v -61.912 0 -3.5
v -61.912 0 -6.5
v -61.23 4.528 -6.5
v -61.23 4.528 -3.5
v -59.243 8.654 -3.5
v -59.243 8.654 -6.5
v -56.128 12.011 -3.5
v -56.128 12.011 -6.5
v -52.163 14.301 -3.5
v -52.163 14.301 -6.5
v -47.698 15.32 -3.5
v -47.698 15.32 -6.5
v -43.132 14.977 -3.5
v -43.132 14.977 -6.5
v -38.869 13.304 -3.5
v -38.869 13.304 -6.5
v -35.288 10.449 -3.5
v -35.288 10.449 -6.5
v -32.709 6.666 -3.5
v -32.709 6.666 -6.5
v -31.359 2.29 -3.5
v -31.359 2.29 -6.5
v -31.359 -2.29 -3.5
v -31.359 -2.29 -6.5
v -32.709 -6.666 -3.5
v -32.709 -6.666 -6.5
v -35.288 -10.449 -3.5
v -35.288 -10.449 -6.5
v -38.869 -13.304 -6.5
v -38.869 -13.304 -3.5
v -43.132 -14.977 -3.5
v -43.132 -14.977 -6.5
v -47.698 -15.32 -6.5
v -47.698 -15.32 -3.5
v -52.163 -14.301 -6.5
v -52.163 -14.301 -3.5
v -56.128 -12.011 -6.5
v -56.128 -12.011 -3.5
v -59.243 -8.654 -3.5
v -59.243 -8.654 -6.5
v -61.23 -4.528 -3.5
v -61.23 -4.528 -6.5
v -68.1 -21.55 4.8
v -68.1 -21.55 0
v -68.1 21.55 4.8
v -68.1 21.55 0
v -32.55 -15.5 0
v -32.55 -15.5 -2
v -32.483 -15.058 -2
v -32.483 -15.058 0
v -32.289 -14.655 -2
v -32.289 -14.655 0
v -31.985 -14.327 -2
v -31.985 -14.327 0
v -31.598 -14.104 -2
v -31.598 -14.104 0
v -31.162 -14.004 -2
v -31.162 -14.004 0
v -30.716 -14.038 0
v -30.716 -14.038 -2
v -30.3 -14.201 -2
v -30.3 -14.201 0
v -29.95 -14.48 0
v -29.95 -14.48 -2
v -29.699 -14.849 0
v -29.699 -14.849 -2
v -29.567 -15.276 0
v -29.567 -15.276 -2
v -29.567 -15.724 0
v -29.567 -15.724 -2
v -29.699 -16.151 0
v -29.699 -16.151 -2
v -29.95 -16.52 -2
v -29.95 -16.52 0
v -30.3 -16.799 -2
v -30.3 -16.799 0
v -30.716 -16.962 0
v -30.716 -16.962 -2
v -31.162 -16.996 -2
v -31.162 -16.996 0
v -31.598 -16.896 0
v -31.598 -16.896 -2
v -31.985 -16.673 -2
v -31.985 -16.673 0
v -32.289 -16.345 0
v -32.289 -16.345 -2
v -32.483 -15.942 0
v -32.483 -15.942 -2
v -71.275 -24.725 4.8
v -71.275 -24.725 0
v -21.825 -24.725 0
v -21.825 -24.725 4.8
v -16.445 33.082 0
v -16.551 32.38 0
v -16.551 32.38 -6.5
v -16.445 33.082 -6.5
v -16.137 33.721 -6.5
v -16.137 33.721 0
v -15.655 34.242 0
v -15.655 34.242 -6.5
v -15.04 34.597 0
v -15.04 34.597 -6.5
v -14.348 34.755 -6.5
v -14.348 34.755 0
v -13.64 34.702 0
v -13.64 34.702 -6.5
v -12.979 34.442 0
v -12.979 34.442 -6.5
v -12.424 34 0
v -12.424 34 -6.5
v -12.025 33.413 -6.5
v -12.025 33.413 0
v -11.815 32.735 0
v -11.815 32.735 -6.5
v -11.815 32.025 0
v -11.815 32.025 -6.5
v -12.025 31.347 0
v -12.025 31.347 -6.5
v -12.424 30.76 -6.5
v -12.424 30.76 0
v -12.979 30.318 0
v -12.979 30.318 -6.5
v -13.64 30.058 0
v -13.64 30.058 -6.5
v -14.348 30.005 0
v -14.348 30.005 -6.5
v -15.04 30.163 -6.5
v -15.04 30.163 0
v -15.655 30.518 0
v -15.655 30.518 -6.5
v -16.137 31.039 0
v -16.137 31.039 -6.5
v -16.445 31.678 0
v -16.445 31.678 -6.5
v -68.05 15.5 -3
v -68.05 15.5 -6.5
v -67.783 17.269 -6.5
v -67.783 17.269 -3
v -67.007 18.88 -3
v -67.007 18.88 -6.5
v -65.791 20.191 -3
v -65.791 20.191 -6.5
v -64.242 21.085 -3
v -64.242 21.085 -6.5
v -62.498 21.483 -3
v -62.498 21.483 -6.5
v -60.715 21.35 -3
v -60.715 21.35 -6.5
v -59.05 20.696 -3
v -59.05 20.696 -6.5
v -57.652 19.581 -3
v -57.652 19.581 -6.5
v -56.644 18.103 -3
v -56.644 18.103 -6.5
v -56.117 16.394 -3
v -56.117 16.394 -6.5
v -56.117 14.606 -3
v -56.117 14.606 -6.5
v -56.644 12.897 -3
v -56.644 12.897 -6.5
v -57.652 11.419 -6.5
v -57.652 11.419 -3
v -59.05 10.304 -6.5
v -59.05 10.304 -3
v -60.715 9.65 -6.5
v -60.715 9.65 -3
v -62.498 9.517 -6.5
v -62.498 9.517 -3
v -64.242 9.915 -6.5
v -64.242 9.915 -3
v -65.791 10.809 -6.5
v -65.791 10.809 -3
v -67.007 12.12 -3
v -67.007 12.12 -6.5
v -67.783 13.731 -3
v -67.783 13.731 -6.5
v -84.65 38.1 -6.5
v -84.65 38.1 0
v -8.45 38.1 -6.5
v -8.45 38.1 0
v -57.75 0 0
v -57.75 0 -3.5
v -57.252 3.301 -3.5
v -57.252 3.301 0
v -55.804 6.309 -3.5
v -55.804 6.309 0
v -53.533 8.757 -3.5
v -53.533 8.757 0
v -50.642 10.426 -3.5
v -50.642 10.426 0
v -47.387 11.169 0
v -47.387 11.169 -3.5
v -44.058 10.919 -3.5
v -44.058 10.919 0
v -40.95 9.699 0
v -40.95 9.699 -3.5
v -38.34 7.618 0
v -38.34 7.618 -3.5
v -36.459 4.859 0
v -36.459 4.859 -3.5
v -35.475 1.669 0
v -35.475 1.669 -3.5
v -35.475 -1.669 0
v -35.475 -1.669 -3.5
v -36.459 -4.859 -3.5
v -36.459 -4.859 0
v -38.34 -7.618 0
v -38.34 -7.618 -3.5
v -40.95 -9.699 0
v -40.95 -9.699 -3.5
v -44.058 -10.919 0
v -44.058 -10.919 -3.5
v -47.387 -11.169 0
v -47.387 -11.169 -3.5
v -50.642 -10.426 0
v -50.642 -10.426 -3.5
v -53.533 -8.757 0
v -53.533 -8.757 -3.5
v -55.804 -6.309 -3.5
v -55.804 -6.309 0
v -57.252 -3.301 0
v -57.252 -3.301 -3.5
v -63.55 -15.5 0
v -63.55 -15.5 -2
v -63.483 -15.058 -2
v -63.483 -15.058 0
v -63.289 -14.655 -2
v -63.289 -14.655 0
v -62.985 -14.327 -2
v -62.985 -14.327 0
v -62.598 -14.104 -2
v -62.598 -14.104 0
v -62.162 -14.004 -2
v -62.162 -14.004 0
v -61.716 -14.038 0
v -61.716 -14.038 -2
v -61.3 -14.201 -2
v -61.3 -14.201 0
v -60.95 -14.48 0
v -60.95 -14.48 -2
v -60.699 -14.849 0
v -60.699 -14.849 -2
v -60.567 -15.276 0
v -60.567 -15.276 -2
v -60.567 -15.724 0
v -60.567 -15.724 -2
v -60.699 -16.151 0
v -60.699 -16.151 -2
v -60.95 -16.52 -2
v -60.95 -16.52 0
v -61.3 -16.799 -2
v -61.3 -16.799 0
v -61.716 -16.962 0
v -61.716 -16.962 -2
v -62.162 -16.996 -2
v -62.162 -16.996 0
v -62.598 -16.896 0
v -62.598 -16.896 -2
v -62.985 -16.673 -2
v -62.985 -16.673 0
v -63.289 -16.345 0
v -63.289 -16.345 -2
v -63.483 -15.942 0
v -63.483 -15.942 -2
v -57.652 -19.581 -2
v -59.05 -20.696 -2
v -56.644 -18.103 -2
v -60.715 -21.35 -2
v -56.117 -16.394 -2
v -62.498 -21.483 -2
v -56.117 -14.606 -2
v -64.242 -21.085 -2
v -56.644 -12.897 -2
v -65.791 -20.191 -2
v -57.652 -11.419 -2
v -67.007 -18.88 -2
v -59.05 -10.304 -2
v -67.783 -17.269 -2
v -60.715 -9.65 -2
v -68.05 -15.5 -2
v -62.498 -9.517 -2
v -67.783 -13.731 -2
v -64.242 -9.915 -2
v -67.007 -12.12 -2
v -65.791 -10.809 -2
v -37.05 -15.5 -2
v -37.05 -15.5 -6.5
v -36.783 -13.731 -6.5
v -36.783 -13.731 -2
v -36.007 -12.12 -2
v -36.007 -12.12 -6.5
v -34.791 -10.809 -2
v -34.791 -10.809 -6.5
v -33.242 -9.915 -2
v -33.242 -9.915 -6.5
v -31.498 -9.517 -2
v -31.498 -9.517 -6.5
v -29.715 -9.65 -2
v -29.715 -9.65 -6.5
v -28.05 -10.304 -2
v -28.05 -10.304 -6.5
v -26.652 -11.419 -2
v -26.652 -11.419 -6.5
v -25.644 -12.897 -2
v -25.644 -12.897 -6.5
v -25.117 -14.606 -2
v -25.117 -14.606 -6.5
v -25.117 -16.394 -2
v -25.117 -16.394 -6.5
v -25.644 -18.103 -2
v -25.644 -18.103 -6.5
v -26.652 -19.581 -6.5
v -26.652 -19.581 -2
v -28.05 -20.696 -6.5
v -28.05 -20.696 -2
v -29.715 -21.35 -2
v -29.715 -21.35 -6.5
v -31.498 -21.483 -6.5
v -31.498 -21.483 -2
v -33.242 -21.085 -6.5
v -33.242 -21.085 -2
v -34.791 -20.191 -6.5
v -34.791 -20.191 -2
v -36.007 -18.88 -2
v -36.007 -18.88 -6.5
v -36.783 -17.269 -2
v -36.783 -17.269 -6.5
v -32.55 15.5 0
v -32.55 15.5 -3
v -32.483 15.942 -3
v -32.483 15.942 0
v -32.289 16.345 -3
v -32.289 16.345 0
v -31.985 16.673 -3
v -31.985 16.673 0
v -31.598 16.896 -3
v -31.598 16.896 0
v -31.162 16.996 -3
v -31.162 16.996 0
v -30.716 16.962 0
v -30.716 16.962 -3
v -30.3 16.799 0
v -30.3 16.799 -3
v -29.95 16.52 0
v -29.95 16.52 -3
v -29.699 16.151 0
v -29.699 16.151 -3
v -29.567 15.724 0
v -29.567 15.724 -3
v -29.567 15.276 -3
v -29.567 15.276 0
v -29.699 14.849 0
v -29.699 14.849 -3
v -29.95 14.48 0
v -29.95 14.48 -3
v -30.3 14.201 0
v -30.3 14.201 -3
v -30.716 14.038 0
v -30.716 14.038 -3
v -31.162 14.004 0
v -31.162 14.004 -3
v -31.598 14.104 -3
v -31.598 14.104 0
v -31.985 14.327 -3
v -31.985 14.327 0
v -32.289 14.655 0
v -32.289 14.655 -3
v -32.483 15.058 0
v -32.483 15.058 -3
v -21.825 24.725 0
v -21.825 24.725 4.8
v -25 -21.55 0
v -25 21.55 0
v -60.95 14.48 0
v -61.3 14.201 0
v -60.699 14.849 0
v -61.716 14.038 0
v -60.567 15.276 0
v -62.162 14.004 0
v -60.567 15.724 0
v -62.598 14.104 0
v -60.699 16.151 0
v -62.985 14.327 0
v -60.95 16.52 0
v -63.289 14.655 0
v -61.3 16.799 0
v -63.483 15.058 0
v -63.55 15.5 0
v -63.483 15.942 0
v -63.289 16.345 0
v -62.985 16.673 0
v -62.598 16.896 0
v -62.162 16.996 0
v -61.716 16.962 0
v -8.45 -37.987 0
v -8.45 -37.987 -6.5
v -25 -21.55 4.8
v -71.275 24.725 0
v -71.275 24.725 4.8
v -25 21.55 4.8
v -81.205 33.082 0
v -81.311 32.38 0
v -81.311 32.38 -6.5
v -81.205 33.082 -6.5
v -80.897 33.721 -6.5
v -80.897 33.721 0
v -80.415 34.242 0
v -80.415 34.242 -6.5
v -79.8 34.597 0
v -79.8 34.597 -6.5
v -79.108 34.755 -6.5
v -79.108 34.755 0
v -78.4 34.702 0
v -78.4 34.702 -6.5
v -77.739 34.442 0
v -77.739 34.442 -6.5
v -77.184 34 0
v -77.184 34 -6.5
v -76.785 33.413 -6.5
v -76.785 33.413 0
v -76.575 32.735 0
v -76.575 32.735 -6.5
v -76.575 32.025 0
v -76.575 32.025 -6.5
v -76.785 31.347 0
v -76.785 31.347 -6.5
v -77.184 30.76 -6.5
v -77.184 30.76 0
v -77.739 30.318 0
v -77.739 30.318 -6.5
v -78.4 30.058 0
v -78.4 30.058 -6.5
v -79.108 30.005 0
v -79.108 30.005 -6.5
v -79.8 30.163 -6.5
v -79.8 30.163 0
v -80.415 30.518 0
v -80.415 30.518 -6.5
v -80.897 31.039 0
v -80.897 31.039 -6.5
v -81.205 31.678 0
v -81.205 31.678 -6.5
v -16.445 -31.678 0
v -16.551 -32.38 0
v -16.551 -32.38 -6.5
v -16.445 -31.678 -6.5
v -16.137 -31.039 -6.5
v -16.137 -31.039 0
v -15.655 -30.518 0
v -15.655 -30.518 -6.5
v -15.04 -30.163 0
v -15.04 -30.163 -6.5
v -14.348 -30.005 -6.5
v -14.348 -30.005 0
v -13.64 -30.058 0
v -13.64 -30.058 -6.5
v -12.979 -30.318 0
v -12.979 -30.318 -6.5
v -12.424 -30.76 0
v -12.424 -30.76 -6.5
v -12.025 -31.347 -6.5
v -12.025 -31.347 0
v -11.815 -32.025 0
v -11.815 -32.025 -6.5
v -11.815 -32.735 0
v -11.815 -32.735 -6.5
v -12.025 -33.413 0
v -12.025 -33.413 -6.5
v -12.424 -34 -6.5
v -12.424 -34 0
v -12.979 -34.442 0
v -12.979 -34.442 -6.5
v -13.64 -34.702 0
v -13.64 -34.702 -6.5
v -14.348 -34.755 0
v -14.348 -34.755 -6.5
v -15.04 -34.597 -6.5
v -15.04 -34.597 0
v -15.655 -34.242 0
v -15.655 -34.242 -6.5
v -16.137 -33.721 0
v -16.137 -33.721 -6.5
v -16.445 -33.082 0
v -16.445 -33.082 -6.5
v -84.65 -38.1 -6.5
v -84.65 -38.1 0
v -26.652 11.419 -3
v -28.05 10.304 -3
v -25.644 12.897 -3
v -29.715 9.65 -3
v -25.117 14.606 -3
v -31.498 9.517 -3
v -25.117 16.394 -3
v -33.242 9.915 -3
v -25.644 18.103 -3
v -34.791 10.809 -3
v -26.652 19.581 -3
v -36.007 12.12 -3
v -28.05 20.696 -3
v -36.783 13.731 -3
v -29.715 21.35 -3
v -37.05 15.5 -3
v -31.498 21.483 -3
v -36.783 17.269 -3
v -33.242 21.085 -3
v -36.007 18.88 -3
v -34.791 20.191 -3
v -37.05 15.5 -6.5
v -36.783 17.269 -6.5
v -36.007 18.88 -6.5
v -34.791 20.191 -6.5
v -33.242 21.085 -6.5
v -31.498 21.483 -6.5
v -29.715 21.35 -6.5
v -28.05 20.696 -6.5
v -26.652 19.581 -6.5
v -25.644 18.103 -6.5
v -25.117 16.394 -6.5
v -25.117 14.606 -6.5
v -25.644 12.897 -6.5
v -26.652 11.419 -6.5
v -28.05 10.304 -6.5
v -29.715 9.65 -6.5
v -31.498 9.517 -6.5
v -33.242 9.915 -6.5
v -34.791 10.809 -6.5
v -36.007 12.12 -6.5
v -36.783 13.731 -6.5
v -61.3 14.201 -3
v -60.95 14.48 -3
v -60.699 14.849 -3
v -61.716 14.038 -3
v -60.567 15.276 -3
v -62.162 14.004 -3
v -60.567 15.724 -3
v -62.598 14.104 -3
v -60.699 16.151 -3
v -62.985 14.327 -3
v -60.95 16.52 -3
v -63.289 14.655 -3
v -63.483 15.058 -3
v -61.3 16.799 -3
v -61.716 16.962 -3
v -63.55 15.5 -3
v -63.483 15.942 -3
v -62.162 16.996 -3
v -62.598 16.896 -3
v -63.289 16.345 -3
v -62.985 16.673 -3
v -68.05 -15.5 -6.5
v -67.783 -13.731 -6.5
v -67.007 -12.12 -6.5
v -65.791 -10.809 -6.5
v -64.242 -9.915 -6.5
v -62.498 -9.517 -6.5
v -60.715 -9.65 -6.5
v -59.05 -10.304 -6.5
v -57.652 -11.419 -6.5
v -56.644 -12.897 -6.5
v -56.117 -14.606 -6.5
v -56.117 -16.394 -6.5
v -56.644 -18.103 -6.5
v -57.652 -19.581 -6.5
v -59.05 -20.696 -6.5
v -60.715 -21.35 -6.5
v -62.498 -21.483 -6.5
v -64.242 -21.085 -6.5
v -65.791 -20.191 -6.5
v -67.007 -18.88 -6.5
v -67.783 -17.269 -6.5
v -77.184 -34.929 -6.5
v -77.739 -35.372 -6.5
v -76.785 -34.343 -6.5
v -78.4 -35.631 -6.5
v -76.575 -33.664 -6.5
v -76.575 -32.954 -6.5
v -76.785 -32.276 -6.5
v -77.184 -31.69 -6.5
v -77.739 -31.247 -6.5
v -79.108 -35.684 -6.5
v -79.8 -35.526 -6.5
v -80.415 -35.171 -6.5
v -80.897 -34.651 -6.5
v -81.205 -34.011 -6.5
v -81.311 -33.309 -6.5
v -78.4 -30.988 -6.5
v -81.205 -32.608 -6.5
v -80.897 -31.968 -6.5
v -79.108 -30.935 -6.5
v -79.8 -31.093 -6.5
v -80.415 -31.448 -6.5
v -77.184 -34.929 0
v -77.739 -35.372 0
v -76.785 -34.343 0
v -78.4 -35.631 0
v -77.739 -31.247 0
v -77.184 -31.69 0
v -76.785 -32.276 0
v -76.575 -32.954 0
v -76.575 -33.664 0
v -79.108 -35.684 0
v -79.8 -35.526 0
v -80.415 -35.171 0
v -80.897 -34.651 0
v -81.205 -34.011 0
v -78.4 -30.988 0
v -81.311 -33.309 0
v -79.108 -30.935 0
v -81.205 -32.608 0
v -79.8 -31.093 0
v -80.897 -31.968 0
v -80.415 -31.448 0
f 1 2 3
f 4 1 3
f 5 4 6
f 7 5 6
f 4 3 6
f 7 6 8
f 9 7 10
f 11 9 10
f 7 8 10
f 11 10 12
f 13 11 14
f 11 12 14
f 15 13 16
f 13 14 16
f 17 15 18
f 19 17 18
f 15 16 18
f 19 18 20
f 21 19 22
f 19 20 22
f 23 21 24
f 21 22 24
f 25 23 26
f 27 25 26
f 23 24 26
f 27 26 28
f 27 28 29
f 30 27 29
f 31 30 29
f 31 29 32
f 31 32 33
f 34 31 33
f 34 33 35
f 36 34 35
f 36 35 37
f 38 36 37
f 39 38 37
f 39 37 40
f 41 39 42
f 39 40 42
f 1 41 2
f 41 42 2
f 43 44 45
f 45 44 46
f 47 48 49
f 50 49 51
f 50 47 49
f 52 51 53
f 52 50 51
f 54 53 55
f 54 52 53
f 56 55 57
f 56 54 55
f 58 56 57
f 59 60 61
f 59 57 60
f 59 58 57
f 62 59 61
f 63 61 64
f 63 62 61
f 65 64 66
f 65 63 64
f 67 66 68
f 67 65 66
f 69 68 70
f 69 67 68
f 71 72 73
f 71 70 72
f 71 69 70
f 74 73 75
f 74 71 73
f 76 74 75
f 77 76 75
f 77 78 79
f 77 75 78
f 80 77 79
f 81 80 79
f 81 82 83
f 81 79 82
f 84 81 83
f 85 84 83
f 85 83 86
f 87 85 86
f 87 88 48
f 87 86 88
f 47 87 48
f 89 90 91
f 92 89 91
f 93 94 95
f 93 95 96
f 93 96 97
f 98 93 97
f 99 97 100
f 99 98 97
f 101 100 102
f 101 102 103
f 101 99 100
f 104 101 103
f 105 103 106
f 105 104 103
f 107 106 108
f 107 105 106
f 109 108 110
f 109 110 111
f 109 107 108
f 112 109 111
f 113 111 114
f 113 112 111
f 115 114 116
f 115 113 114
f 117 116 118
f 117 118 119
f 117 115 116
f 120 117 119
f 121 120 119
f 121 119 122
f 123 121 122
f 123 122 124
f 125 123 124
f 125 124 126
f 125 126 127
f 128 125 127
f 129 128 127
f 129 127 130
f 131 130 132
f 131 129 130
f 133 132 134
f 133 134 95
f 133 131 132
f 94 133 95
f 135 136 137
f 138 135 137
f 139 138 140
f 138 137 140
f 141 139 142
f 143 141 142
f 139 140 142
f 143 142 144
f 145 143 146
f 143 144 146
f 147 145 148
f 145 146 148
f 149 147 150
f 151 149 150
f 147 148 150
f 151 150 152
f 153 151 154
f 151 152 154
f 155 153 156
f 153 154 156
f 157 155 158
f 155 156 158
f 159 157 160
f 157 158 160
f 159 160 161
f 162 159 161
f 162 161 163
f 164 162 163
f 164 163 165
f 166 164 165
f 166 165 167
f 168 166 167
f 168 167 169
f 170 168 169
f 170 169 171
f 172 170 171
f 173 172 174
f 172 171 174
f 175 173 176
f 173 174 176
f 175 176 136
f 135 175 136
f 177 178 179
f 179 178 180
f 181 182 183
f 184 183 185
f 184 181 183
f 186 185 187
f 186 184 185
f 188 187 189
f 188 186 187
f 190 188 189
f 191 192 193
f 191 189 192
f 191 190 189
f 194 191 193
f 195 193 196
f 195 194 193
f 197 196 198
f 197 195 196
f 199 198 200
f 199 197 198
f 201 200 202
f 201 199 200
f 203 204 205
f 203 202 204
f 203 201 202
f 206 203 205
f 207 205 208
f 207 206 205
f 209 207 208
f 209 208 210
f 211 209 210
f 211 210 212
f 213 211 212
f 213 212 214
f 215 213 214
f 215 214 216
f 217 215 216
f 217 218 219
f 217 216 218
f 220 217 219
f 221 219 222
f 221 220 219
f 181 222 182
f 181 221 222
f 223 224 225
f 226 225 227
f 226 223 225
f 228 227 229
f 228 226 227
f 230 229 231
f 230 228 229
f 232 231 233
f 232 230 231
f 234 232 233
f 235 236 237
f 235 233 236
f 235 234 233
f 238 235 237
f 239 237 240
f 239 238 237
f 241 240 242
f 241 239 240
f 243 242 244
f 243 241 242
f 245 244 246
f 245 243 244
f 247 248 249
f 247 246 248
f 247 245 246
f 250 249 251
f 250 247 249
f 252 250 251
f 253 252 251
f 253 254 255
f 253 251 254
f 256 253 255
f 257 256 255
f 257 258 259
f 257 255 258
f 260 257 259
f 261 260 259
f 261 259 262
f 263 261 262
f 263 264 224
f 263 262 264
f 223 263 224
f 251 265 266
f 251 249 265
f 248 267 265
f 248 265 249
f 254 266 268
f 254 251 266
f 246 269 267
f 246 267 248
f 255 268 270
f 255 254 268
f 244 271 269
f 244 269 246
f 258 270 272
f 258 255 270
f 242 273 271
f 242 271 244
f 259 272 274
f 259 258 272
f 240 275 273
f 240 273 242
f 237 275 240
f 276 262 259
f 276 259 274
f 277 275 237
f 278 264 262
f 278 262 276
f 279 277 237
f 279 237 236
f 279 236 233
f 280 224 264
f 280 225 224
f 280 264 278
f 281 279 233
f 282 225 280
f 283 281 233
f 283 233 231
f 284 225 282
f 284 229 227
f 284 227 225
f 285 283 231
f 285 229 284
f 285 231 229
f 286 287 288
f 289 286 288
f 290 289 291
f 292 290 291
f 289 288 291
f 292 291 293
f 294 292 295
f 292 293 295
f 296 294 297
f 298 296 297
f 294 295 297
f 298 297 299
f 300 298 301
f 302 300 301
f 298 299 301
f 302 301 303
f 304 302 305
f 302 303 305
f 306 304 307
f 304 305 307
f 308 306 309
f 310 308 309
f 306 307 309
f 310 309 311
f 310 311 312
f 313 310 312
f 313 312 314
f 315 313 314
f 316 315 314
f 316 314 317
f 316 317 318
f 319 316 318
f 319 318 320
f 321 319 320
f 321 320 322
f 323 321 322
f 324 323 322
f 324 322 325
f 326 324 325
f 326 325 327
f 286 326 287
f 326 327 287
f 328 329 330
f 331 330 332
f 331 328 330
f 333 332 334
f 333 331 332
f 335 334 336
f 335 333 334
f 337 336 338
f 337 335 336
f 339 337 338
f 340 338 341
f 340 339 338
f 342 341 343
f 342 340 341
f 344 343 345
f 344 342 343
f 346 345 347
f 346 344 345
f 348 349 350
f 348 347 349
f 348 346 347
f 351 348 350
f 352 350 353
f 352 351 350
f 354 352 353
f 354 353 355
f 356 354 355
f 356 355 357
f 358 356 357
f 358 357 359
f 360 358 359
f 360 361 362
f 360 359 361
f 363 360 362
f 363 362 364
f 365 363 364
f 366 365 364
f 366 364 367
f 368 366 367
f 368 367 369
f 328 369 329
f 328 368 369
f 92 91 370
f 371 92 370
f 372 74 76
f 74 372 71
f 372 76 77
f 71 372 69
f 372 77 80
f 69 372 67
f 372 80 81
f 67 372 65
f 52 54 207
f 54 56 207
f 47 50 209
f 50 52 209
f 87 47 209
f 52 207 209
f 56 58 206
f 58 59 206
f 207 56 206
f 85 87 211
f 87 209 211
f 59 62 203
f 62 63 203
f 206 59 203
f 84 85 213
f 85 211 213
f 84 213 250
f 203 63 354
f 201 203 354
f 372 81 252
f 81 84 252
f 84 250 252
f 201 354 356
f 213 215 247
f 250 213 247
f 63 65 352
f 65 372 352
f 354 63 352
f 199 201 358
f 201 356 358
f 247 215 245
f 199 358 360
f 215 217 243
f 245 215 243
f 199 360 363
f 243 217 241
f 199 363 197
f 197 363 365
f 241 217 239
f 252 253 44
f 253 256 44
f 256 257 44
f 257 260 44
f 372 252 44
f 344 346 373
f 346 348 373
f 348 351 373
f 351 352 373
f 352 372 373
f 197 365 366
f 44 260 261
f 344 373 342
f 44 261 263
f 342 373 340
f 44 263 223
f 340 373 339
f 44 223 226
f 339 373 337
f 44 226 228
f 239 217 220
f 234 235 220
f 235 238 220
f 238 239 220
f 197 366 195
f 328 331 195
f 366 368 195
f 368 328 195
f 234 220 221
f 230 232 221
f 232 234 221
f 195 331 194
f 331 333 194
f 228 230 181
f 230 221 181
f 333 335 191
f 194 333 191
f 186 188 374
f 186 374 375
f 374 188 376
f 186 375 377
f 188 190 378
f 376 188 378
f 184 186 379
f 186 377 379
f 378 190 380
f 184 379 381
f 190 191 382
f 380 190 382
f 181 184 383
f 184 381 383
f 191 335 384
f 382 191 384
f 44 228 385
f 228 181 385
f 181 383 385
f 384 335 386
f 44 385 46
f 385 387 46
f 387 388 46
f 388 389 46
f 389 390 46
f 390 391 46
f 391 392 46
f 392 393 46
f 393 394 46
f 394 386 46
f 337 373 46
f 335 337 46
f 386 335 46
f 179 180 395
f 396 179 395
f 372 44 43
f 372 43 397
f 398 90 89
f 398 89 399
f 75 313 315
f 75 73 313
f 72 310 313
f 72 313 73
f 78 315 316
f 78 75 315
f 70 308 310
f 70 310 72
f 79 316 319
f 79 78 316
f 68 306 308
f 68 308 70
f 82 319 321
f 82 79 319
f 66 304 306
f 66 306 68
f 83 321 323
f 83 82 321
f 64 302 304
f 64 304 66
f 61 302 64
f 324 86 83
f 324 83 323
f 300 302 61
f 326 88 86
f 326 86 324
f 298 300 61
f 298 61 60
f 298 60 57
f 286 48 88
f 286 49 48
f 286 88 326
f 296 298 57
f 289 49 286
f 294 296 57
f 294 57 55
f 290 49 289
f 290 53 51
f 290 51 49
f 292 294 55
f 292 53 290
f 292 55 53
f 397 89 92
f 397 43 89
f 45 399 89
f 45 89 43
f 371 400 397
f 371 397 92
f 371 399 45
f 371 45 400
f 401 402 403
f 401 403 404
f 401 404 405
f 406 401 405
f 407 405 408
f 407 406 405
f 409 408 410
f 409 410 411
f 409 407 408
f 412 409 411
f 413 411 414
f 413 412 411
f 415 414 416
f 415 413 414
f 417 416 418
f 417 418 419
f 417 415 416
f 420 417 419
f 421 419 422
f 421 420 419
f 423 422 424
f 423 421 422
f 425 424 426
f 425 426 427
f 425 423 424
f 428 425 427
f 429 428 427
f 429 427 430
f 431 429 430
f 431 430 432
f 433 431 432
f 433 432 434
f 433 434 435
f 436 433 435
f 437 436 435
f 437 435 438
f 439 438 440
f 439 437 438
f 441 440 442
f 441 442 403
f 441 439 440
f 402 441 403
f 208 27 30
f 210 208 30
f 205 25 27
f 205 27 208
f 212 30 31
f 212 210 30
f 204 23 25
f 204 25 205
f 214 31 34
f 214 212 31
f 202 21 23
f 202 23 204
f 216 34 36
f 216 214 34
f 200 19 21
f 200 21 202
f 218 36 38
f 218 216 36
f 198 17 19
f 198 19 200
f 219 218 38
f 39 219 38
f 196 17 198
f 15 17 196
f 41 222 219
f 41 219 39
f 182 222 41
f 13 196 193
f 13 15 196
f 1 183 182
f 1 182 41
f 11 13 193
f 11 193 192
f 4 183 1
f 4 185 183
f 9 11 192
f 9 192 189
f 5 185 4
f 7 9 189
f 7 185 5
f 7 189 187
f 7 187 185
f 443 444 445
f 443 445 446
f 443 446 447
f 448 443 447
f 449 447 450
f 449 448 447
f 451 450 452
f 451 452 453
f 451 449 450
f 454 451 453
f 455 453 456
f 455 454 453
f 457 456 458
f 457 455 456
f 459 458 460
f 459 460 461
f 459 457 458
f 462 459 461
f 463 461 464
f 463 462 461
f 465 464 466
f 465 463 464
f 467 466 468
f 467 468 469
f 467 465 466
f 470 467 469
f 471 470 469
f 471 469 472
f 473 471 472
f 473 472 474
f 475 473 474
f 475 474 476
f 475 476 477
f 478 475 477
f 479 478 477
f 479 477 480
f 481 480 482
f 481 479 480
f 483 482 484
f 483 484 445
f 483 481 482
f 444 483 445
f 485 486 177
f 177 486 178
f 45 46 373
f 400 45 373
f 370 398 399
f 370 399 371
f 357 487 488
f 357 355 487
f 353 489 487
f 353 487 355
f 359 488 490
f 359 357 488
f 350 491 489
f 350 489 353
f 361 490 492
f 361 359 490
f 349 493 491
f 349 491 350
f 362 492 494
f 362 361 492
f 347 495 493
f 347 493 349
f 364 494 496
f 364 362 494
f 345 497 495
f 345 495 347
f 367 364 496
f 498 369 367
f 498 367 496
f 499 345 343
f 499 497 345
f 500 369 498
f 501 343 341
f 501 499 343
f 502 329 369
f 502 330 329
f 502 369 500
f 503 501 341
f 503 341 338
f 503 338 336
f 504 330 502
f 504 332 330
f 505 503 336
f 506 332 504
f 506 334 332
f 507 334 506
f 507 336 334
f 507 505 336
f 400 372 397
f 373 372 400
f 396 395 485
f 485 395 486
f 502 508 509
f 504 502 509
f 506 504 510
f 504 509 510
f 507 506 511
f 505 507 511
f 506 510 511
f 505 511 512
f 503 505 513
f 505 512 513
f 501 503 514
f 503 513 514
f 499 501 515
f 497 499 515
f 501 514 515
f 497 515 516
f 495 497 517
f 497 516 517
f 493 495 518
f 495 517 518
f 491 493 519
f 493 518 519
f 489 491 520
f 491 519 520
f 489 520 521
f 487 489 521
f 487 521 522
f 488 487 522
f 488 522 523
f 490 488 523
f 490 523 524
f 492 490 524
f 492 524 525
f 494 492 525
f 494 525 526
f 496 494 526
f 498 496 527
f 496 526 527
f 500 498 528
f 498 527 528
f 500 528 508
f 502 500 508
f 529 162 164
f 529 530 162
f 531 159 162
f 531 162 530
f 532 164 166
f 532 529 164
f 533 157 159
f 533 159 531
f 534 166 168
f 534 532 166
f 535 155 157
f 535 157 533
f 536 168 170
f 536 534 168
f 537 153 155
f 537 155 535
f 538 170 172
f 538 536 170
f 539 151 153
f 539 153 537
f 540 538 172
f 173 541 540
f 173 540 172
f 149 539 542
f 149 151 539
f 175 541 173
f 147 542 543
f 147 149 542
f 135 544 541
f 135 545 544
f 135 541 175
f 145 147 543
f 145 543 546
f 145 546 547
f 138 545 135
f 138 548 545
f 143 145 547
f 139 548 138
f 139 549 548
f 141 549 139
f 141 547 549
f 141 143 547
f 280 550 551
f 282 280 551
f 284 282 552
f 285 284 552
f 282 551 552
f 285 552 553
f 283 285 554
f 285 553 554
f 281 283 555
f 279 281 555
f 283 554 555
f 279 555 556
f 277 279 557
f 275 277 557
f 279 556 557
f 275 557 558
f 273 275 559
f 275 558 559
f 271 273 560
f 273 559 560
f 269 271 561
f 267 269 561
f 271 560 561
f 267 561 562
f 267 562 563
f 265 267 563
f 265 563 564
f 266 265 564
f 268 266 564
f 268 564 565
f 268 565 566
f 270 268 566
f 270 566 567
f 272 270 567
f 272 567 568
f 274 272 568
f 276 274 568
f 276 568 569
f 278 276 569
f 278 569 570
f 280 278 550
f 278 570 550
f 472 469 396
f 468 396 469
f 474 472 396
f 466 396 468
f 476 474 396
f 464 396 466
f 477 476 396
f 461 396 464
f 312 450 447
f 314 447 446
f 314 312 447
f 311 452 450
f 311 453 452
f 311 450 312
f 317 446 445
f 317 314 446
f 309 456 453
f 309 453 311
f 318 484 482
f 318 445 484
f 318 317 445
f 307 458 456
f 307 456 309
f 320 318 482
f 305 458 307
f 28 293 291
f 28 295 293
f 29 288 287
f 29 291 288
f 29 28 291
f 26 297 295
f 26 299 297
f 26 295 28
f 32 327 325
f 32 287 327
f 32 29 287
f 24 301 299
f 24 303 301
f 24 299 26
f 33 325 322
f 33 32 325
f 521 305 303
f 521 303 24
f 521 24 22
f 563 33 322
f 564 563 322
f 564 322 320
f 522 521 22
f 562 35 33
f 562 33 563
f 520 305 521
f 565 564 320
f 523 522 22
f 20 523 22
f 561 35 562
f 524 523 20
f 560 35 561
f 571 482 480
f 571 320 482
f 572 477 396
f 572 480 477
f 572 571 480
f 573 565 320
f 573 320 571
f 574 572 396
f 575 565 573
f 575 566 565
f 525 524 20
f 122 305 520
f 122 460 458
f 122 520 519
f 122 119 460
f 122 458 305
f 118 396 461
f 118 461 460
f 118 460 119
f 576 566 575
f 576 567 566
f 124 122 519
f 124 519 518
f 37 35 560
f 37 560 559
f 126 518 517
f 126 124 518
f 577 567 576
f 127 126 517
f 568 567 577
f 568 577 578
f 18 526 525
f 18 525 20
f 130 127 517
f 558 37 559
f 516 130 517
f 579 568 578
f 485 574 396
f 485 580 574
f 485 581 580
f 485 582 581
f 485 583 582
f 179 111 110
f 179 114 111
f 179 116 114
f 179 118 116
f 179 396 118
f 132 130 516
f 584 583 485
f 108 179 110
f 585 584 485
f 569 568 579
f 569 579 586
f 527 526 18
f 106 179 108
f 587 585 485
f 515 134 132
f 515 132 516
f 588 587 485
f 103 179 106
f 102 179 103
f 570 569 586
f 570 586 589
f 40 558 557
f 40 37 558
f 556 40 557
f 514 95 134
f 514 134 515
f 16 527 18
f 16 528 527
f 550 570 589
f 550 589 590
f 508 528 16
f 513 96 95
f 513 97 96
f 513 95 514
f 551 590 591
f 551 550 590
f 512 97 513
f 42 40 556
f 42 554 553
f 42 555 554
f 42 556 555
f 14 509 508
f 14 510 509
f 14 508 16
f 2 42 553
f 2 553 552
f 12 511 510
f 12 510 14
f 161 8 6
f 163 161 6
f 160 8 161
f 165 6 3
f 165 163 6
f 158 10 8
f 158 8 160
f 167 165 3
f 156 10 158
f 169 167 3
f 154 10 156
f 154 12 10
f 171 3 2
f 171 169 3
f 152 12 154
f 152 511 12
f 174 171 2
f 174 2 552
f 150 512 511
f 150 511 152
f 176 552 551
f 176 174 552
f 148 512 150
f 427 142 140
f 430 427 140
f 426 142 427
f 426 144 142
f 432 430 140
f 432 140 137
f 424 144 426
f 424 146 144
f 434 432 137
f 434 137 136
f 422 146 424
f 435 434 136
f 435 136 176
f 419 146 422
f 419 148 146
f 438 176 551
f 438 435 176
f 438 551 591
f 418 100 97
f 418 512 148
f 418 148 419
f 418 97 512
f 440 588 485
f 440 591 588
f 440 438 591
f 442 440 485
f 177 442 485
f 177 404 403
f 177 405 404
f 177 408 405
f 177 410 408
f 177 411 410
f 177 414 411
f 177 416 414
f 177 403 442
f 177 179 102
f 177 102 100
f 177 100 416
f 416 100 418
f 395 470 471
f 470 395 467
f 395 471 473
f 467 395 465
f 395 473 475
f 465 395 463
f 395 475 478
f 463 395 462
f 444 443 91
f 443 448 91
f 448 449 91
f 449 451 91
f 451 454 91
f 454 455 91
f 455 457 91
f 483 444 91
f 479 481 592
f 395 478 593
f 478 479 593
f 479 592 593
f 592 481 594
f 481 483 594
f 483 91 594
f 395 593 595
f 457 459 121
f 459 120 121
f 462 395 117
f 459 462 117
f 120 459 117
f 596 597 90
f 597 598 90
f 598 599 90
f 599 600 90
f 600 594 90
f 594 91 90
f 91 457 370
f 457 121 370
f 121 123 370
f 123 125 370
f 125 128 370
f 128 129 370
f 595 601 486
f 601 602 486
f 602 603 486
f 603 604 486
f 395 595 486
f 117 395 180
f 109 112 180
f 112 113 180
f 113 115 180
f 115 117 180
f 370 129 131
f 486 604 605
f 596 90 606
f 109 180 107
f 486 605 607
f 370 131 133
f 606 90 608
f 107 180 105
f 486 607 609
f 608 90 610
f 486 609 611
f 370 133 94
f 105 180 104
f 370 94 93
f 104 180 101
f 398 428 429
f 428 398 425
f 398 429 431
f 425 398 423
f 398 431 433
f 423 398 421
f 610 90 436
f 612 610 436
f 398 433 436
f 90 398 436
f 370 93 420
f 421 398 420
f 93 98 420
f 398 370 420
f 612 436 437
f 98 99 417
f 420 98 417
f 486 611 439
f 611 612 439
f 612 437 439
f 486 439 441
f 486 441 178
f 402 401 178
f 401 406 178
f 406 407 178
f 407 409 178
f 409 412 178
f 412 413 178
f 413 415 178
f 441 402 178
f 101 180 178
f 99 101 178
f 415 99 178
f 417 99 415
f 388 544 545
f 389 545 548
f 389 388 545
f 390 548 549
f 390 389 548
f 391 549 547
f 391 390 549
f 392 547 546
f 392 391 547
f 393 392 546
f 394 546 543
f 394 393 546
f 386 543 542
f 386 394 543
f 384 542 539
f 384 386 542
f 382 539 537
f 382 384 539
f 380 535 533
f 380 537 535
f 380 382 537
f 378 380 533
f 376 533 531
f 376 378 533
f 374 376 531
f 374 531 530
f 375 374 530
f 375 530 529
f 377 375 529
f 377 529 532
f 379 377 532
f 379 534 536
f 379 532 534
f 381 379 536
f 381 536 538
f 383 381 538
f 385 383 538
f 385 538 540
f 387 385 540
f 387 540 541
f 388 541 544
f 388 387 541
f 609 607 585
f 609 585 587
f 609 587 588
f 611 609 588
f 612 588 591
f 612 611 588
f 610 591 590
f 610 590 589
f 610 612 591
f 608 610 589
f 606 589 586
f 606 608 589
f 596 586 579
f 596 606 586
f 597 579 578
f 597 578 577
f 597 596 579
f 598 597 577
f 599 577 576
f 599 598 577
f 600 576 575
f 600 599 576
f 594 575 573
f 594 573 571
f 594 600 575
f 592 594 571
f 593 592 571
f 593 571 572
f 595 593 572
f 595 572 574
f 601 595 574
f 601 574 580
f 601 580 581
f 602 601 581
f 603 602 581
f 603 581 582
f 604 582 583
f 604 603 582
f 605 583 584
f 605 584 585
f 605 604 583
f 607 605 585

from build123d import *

# Parameters (mm, degrees)
SKETCH5_W      = 49.45
SKETCH5_H      = 49.45
SKETCH5_W_2    = 43.1
SKETCH5_H_2    = 43.1
EXTRUDE1_DEPTH = 4.8
SKETCH6_R      = 1.5
SKETCH6_R_2    = 2.38125
SKETCH6_R_3    = 11.2
EXTRUDE2_DEPTH = 6.5
SKETCH7_R      = 6
EXTRUDE3_DEPTH = 4.5
SKETCH8_R      = 6
EXTRUDE4_DEPTH = 3.5
SKETCH9_R      = 15.3625
EXTRUDE5_DEPTH = 3


with BuildPart() as part:
    # Sketch5 → Extrude1 (new body)
    with BuildSketch(Plane.XY):
        with Locations((-46.55, 0)):
            Rectangle(SKETCH5_W, SKETCH5_H)
        with Locations((-46.55, 0)):
            Rectangle(SKETCH5_W_2, SKETCH5_H_2, mode=Mode.SUBTRACT)
    extrude(amount=EXTRUDE1_DEPTH)

    # Sketch6 → Extrude2 (add)
    with BuildSketch(Plane(origin=(0, 0, 0), x_dir=(-1, 0, 0), z_dir=(0, 0, -1))):
        Polygon((8.45, 38.1), (8.45, -37.987007671), (84.65, -38.1), (84.65, 38.1), align=None)
        with Locations((62.05, 15.5)):
            Circle(SKETCH6_R, mode=Mode.SUBTRACT)
        with Locations((31.05, 15.5)):
            Circle(SKETCH6_R, mode=Mode.SUBTRACT)
        with Locations((62.05, -15.5)):
            Circle(SKETCH6_R, mode=Mode.SUBTRACT)
        with Locations((31.05, -15.5)):
            Circle(SKETCH6_R, mode=Mode.SUBTRACT)
        with Locations((14.17, 32.38)):
            Circle(SKETCH6_R_2, mode=Mode.SUBTRACT)
        with Locations((78.93, 32.38)):
            Circle(SKETCH6_R_2, mode=Mode.SUBTRACT)
        with Locations((78.93, -33.309394929)):
            Circle(SKETCH6_R_2, mode=Mode.SUBTRACT)
        with Locations((14.17, -32.38)):
            Circle(SKETCH6_R_2, mode=Mode.SUBTRACT)
        with Locations((46.55, 0)):
            Circle(SKETCH6_R_3, mode=Mode.SUBTRACT)
    extrude(amount=EXTRUDE2_DEPTH)

    # Sketch7 → Extrude3 (cut)
    with BuildSketch(Plane(origin=(0, 0, -6.5), x_dir=(-1, 0, 0), z_dir=(0, 0, -1))):
        with Locations((62.05, -15.5)):
            Circle(SKETCH7_R)
        with Locations((31.05, -15.5)):
            Circle(SKETCH7_R)
    extrude(amount=-EXTRUDE3_DEPTH, mode=Mode.SUBTRACT)

    # Sketch8 → Extrude4 (cut)
    with BuildSketch(Plane(origin=(0, 0, -6.5), x_dir=(-1, 0, 0), z_dir=(0, 0, -1))):
        with Locations((62.05, 15.5)):
            Circle(SKETCH8_R)
        with Locations((31.05, 15.5)):
            Circle(SKETCH8_R)
    extrude(amount=-EXTRUDE4_DEPTH, mode=Mode.SUBTRACT)

    # Sketch9 → Extrude5 (cut)
    with BuildSketch(Plane(origin=(0, 0, -6.5), x_dir=(-1, 0, 0), z_dir=(0, 0, -1))):
        with Locations((46.55, 0)):
            Circle(SKETCH9_R)
    extrude(amount=-EXTRUDE5_DEPTH, mode=Mode.SUBTRACT)


solid = part.part
